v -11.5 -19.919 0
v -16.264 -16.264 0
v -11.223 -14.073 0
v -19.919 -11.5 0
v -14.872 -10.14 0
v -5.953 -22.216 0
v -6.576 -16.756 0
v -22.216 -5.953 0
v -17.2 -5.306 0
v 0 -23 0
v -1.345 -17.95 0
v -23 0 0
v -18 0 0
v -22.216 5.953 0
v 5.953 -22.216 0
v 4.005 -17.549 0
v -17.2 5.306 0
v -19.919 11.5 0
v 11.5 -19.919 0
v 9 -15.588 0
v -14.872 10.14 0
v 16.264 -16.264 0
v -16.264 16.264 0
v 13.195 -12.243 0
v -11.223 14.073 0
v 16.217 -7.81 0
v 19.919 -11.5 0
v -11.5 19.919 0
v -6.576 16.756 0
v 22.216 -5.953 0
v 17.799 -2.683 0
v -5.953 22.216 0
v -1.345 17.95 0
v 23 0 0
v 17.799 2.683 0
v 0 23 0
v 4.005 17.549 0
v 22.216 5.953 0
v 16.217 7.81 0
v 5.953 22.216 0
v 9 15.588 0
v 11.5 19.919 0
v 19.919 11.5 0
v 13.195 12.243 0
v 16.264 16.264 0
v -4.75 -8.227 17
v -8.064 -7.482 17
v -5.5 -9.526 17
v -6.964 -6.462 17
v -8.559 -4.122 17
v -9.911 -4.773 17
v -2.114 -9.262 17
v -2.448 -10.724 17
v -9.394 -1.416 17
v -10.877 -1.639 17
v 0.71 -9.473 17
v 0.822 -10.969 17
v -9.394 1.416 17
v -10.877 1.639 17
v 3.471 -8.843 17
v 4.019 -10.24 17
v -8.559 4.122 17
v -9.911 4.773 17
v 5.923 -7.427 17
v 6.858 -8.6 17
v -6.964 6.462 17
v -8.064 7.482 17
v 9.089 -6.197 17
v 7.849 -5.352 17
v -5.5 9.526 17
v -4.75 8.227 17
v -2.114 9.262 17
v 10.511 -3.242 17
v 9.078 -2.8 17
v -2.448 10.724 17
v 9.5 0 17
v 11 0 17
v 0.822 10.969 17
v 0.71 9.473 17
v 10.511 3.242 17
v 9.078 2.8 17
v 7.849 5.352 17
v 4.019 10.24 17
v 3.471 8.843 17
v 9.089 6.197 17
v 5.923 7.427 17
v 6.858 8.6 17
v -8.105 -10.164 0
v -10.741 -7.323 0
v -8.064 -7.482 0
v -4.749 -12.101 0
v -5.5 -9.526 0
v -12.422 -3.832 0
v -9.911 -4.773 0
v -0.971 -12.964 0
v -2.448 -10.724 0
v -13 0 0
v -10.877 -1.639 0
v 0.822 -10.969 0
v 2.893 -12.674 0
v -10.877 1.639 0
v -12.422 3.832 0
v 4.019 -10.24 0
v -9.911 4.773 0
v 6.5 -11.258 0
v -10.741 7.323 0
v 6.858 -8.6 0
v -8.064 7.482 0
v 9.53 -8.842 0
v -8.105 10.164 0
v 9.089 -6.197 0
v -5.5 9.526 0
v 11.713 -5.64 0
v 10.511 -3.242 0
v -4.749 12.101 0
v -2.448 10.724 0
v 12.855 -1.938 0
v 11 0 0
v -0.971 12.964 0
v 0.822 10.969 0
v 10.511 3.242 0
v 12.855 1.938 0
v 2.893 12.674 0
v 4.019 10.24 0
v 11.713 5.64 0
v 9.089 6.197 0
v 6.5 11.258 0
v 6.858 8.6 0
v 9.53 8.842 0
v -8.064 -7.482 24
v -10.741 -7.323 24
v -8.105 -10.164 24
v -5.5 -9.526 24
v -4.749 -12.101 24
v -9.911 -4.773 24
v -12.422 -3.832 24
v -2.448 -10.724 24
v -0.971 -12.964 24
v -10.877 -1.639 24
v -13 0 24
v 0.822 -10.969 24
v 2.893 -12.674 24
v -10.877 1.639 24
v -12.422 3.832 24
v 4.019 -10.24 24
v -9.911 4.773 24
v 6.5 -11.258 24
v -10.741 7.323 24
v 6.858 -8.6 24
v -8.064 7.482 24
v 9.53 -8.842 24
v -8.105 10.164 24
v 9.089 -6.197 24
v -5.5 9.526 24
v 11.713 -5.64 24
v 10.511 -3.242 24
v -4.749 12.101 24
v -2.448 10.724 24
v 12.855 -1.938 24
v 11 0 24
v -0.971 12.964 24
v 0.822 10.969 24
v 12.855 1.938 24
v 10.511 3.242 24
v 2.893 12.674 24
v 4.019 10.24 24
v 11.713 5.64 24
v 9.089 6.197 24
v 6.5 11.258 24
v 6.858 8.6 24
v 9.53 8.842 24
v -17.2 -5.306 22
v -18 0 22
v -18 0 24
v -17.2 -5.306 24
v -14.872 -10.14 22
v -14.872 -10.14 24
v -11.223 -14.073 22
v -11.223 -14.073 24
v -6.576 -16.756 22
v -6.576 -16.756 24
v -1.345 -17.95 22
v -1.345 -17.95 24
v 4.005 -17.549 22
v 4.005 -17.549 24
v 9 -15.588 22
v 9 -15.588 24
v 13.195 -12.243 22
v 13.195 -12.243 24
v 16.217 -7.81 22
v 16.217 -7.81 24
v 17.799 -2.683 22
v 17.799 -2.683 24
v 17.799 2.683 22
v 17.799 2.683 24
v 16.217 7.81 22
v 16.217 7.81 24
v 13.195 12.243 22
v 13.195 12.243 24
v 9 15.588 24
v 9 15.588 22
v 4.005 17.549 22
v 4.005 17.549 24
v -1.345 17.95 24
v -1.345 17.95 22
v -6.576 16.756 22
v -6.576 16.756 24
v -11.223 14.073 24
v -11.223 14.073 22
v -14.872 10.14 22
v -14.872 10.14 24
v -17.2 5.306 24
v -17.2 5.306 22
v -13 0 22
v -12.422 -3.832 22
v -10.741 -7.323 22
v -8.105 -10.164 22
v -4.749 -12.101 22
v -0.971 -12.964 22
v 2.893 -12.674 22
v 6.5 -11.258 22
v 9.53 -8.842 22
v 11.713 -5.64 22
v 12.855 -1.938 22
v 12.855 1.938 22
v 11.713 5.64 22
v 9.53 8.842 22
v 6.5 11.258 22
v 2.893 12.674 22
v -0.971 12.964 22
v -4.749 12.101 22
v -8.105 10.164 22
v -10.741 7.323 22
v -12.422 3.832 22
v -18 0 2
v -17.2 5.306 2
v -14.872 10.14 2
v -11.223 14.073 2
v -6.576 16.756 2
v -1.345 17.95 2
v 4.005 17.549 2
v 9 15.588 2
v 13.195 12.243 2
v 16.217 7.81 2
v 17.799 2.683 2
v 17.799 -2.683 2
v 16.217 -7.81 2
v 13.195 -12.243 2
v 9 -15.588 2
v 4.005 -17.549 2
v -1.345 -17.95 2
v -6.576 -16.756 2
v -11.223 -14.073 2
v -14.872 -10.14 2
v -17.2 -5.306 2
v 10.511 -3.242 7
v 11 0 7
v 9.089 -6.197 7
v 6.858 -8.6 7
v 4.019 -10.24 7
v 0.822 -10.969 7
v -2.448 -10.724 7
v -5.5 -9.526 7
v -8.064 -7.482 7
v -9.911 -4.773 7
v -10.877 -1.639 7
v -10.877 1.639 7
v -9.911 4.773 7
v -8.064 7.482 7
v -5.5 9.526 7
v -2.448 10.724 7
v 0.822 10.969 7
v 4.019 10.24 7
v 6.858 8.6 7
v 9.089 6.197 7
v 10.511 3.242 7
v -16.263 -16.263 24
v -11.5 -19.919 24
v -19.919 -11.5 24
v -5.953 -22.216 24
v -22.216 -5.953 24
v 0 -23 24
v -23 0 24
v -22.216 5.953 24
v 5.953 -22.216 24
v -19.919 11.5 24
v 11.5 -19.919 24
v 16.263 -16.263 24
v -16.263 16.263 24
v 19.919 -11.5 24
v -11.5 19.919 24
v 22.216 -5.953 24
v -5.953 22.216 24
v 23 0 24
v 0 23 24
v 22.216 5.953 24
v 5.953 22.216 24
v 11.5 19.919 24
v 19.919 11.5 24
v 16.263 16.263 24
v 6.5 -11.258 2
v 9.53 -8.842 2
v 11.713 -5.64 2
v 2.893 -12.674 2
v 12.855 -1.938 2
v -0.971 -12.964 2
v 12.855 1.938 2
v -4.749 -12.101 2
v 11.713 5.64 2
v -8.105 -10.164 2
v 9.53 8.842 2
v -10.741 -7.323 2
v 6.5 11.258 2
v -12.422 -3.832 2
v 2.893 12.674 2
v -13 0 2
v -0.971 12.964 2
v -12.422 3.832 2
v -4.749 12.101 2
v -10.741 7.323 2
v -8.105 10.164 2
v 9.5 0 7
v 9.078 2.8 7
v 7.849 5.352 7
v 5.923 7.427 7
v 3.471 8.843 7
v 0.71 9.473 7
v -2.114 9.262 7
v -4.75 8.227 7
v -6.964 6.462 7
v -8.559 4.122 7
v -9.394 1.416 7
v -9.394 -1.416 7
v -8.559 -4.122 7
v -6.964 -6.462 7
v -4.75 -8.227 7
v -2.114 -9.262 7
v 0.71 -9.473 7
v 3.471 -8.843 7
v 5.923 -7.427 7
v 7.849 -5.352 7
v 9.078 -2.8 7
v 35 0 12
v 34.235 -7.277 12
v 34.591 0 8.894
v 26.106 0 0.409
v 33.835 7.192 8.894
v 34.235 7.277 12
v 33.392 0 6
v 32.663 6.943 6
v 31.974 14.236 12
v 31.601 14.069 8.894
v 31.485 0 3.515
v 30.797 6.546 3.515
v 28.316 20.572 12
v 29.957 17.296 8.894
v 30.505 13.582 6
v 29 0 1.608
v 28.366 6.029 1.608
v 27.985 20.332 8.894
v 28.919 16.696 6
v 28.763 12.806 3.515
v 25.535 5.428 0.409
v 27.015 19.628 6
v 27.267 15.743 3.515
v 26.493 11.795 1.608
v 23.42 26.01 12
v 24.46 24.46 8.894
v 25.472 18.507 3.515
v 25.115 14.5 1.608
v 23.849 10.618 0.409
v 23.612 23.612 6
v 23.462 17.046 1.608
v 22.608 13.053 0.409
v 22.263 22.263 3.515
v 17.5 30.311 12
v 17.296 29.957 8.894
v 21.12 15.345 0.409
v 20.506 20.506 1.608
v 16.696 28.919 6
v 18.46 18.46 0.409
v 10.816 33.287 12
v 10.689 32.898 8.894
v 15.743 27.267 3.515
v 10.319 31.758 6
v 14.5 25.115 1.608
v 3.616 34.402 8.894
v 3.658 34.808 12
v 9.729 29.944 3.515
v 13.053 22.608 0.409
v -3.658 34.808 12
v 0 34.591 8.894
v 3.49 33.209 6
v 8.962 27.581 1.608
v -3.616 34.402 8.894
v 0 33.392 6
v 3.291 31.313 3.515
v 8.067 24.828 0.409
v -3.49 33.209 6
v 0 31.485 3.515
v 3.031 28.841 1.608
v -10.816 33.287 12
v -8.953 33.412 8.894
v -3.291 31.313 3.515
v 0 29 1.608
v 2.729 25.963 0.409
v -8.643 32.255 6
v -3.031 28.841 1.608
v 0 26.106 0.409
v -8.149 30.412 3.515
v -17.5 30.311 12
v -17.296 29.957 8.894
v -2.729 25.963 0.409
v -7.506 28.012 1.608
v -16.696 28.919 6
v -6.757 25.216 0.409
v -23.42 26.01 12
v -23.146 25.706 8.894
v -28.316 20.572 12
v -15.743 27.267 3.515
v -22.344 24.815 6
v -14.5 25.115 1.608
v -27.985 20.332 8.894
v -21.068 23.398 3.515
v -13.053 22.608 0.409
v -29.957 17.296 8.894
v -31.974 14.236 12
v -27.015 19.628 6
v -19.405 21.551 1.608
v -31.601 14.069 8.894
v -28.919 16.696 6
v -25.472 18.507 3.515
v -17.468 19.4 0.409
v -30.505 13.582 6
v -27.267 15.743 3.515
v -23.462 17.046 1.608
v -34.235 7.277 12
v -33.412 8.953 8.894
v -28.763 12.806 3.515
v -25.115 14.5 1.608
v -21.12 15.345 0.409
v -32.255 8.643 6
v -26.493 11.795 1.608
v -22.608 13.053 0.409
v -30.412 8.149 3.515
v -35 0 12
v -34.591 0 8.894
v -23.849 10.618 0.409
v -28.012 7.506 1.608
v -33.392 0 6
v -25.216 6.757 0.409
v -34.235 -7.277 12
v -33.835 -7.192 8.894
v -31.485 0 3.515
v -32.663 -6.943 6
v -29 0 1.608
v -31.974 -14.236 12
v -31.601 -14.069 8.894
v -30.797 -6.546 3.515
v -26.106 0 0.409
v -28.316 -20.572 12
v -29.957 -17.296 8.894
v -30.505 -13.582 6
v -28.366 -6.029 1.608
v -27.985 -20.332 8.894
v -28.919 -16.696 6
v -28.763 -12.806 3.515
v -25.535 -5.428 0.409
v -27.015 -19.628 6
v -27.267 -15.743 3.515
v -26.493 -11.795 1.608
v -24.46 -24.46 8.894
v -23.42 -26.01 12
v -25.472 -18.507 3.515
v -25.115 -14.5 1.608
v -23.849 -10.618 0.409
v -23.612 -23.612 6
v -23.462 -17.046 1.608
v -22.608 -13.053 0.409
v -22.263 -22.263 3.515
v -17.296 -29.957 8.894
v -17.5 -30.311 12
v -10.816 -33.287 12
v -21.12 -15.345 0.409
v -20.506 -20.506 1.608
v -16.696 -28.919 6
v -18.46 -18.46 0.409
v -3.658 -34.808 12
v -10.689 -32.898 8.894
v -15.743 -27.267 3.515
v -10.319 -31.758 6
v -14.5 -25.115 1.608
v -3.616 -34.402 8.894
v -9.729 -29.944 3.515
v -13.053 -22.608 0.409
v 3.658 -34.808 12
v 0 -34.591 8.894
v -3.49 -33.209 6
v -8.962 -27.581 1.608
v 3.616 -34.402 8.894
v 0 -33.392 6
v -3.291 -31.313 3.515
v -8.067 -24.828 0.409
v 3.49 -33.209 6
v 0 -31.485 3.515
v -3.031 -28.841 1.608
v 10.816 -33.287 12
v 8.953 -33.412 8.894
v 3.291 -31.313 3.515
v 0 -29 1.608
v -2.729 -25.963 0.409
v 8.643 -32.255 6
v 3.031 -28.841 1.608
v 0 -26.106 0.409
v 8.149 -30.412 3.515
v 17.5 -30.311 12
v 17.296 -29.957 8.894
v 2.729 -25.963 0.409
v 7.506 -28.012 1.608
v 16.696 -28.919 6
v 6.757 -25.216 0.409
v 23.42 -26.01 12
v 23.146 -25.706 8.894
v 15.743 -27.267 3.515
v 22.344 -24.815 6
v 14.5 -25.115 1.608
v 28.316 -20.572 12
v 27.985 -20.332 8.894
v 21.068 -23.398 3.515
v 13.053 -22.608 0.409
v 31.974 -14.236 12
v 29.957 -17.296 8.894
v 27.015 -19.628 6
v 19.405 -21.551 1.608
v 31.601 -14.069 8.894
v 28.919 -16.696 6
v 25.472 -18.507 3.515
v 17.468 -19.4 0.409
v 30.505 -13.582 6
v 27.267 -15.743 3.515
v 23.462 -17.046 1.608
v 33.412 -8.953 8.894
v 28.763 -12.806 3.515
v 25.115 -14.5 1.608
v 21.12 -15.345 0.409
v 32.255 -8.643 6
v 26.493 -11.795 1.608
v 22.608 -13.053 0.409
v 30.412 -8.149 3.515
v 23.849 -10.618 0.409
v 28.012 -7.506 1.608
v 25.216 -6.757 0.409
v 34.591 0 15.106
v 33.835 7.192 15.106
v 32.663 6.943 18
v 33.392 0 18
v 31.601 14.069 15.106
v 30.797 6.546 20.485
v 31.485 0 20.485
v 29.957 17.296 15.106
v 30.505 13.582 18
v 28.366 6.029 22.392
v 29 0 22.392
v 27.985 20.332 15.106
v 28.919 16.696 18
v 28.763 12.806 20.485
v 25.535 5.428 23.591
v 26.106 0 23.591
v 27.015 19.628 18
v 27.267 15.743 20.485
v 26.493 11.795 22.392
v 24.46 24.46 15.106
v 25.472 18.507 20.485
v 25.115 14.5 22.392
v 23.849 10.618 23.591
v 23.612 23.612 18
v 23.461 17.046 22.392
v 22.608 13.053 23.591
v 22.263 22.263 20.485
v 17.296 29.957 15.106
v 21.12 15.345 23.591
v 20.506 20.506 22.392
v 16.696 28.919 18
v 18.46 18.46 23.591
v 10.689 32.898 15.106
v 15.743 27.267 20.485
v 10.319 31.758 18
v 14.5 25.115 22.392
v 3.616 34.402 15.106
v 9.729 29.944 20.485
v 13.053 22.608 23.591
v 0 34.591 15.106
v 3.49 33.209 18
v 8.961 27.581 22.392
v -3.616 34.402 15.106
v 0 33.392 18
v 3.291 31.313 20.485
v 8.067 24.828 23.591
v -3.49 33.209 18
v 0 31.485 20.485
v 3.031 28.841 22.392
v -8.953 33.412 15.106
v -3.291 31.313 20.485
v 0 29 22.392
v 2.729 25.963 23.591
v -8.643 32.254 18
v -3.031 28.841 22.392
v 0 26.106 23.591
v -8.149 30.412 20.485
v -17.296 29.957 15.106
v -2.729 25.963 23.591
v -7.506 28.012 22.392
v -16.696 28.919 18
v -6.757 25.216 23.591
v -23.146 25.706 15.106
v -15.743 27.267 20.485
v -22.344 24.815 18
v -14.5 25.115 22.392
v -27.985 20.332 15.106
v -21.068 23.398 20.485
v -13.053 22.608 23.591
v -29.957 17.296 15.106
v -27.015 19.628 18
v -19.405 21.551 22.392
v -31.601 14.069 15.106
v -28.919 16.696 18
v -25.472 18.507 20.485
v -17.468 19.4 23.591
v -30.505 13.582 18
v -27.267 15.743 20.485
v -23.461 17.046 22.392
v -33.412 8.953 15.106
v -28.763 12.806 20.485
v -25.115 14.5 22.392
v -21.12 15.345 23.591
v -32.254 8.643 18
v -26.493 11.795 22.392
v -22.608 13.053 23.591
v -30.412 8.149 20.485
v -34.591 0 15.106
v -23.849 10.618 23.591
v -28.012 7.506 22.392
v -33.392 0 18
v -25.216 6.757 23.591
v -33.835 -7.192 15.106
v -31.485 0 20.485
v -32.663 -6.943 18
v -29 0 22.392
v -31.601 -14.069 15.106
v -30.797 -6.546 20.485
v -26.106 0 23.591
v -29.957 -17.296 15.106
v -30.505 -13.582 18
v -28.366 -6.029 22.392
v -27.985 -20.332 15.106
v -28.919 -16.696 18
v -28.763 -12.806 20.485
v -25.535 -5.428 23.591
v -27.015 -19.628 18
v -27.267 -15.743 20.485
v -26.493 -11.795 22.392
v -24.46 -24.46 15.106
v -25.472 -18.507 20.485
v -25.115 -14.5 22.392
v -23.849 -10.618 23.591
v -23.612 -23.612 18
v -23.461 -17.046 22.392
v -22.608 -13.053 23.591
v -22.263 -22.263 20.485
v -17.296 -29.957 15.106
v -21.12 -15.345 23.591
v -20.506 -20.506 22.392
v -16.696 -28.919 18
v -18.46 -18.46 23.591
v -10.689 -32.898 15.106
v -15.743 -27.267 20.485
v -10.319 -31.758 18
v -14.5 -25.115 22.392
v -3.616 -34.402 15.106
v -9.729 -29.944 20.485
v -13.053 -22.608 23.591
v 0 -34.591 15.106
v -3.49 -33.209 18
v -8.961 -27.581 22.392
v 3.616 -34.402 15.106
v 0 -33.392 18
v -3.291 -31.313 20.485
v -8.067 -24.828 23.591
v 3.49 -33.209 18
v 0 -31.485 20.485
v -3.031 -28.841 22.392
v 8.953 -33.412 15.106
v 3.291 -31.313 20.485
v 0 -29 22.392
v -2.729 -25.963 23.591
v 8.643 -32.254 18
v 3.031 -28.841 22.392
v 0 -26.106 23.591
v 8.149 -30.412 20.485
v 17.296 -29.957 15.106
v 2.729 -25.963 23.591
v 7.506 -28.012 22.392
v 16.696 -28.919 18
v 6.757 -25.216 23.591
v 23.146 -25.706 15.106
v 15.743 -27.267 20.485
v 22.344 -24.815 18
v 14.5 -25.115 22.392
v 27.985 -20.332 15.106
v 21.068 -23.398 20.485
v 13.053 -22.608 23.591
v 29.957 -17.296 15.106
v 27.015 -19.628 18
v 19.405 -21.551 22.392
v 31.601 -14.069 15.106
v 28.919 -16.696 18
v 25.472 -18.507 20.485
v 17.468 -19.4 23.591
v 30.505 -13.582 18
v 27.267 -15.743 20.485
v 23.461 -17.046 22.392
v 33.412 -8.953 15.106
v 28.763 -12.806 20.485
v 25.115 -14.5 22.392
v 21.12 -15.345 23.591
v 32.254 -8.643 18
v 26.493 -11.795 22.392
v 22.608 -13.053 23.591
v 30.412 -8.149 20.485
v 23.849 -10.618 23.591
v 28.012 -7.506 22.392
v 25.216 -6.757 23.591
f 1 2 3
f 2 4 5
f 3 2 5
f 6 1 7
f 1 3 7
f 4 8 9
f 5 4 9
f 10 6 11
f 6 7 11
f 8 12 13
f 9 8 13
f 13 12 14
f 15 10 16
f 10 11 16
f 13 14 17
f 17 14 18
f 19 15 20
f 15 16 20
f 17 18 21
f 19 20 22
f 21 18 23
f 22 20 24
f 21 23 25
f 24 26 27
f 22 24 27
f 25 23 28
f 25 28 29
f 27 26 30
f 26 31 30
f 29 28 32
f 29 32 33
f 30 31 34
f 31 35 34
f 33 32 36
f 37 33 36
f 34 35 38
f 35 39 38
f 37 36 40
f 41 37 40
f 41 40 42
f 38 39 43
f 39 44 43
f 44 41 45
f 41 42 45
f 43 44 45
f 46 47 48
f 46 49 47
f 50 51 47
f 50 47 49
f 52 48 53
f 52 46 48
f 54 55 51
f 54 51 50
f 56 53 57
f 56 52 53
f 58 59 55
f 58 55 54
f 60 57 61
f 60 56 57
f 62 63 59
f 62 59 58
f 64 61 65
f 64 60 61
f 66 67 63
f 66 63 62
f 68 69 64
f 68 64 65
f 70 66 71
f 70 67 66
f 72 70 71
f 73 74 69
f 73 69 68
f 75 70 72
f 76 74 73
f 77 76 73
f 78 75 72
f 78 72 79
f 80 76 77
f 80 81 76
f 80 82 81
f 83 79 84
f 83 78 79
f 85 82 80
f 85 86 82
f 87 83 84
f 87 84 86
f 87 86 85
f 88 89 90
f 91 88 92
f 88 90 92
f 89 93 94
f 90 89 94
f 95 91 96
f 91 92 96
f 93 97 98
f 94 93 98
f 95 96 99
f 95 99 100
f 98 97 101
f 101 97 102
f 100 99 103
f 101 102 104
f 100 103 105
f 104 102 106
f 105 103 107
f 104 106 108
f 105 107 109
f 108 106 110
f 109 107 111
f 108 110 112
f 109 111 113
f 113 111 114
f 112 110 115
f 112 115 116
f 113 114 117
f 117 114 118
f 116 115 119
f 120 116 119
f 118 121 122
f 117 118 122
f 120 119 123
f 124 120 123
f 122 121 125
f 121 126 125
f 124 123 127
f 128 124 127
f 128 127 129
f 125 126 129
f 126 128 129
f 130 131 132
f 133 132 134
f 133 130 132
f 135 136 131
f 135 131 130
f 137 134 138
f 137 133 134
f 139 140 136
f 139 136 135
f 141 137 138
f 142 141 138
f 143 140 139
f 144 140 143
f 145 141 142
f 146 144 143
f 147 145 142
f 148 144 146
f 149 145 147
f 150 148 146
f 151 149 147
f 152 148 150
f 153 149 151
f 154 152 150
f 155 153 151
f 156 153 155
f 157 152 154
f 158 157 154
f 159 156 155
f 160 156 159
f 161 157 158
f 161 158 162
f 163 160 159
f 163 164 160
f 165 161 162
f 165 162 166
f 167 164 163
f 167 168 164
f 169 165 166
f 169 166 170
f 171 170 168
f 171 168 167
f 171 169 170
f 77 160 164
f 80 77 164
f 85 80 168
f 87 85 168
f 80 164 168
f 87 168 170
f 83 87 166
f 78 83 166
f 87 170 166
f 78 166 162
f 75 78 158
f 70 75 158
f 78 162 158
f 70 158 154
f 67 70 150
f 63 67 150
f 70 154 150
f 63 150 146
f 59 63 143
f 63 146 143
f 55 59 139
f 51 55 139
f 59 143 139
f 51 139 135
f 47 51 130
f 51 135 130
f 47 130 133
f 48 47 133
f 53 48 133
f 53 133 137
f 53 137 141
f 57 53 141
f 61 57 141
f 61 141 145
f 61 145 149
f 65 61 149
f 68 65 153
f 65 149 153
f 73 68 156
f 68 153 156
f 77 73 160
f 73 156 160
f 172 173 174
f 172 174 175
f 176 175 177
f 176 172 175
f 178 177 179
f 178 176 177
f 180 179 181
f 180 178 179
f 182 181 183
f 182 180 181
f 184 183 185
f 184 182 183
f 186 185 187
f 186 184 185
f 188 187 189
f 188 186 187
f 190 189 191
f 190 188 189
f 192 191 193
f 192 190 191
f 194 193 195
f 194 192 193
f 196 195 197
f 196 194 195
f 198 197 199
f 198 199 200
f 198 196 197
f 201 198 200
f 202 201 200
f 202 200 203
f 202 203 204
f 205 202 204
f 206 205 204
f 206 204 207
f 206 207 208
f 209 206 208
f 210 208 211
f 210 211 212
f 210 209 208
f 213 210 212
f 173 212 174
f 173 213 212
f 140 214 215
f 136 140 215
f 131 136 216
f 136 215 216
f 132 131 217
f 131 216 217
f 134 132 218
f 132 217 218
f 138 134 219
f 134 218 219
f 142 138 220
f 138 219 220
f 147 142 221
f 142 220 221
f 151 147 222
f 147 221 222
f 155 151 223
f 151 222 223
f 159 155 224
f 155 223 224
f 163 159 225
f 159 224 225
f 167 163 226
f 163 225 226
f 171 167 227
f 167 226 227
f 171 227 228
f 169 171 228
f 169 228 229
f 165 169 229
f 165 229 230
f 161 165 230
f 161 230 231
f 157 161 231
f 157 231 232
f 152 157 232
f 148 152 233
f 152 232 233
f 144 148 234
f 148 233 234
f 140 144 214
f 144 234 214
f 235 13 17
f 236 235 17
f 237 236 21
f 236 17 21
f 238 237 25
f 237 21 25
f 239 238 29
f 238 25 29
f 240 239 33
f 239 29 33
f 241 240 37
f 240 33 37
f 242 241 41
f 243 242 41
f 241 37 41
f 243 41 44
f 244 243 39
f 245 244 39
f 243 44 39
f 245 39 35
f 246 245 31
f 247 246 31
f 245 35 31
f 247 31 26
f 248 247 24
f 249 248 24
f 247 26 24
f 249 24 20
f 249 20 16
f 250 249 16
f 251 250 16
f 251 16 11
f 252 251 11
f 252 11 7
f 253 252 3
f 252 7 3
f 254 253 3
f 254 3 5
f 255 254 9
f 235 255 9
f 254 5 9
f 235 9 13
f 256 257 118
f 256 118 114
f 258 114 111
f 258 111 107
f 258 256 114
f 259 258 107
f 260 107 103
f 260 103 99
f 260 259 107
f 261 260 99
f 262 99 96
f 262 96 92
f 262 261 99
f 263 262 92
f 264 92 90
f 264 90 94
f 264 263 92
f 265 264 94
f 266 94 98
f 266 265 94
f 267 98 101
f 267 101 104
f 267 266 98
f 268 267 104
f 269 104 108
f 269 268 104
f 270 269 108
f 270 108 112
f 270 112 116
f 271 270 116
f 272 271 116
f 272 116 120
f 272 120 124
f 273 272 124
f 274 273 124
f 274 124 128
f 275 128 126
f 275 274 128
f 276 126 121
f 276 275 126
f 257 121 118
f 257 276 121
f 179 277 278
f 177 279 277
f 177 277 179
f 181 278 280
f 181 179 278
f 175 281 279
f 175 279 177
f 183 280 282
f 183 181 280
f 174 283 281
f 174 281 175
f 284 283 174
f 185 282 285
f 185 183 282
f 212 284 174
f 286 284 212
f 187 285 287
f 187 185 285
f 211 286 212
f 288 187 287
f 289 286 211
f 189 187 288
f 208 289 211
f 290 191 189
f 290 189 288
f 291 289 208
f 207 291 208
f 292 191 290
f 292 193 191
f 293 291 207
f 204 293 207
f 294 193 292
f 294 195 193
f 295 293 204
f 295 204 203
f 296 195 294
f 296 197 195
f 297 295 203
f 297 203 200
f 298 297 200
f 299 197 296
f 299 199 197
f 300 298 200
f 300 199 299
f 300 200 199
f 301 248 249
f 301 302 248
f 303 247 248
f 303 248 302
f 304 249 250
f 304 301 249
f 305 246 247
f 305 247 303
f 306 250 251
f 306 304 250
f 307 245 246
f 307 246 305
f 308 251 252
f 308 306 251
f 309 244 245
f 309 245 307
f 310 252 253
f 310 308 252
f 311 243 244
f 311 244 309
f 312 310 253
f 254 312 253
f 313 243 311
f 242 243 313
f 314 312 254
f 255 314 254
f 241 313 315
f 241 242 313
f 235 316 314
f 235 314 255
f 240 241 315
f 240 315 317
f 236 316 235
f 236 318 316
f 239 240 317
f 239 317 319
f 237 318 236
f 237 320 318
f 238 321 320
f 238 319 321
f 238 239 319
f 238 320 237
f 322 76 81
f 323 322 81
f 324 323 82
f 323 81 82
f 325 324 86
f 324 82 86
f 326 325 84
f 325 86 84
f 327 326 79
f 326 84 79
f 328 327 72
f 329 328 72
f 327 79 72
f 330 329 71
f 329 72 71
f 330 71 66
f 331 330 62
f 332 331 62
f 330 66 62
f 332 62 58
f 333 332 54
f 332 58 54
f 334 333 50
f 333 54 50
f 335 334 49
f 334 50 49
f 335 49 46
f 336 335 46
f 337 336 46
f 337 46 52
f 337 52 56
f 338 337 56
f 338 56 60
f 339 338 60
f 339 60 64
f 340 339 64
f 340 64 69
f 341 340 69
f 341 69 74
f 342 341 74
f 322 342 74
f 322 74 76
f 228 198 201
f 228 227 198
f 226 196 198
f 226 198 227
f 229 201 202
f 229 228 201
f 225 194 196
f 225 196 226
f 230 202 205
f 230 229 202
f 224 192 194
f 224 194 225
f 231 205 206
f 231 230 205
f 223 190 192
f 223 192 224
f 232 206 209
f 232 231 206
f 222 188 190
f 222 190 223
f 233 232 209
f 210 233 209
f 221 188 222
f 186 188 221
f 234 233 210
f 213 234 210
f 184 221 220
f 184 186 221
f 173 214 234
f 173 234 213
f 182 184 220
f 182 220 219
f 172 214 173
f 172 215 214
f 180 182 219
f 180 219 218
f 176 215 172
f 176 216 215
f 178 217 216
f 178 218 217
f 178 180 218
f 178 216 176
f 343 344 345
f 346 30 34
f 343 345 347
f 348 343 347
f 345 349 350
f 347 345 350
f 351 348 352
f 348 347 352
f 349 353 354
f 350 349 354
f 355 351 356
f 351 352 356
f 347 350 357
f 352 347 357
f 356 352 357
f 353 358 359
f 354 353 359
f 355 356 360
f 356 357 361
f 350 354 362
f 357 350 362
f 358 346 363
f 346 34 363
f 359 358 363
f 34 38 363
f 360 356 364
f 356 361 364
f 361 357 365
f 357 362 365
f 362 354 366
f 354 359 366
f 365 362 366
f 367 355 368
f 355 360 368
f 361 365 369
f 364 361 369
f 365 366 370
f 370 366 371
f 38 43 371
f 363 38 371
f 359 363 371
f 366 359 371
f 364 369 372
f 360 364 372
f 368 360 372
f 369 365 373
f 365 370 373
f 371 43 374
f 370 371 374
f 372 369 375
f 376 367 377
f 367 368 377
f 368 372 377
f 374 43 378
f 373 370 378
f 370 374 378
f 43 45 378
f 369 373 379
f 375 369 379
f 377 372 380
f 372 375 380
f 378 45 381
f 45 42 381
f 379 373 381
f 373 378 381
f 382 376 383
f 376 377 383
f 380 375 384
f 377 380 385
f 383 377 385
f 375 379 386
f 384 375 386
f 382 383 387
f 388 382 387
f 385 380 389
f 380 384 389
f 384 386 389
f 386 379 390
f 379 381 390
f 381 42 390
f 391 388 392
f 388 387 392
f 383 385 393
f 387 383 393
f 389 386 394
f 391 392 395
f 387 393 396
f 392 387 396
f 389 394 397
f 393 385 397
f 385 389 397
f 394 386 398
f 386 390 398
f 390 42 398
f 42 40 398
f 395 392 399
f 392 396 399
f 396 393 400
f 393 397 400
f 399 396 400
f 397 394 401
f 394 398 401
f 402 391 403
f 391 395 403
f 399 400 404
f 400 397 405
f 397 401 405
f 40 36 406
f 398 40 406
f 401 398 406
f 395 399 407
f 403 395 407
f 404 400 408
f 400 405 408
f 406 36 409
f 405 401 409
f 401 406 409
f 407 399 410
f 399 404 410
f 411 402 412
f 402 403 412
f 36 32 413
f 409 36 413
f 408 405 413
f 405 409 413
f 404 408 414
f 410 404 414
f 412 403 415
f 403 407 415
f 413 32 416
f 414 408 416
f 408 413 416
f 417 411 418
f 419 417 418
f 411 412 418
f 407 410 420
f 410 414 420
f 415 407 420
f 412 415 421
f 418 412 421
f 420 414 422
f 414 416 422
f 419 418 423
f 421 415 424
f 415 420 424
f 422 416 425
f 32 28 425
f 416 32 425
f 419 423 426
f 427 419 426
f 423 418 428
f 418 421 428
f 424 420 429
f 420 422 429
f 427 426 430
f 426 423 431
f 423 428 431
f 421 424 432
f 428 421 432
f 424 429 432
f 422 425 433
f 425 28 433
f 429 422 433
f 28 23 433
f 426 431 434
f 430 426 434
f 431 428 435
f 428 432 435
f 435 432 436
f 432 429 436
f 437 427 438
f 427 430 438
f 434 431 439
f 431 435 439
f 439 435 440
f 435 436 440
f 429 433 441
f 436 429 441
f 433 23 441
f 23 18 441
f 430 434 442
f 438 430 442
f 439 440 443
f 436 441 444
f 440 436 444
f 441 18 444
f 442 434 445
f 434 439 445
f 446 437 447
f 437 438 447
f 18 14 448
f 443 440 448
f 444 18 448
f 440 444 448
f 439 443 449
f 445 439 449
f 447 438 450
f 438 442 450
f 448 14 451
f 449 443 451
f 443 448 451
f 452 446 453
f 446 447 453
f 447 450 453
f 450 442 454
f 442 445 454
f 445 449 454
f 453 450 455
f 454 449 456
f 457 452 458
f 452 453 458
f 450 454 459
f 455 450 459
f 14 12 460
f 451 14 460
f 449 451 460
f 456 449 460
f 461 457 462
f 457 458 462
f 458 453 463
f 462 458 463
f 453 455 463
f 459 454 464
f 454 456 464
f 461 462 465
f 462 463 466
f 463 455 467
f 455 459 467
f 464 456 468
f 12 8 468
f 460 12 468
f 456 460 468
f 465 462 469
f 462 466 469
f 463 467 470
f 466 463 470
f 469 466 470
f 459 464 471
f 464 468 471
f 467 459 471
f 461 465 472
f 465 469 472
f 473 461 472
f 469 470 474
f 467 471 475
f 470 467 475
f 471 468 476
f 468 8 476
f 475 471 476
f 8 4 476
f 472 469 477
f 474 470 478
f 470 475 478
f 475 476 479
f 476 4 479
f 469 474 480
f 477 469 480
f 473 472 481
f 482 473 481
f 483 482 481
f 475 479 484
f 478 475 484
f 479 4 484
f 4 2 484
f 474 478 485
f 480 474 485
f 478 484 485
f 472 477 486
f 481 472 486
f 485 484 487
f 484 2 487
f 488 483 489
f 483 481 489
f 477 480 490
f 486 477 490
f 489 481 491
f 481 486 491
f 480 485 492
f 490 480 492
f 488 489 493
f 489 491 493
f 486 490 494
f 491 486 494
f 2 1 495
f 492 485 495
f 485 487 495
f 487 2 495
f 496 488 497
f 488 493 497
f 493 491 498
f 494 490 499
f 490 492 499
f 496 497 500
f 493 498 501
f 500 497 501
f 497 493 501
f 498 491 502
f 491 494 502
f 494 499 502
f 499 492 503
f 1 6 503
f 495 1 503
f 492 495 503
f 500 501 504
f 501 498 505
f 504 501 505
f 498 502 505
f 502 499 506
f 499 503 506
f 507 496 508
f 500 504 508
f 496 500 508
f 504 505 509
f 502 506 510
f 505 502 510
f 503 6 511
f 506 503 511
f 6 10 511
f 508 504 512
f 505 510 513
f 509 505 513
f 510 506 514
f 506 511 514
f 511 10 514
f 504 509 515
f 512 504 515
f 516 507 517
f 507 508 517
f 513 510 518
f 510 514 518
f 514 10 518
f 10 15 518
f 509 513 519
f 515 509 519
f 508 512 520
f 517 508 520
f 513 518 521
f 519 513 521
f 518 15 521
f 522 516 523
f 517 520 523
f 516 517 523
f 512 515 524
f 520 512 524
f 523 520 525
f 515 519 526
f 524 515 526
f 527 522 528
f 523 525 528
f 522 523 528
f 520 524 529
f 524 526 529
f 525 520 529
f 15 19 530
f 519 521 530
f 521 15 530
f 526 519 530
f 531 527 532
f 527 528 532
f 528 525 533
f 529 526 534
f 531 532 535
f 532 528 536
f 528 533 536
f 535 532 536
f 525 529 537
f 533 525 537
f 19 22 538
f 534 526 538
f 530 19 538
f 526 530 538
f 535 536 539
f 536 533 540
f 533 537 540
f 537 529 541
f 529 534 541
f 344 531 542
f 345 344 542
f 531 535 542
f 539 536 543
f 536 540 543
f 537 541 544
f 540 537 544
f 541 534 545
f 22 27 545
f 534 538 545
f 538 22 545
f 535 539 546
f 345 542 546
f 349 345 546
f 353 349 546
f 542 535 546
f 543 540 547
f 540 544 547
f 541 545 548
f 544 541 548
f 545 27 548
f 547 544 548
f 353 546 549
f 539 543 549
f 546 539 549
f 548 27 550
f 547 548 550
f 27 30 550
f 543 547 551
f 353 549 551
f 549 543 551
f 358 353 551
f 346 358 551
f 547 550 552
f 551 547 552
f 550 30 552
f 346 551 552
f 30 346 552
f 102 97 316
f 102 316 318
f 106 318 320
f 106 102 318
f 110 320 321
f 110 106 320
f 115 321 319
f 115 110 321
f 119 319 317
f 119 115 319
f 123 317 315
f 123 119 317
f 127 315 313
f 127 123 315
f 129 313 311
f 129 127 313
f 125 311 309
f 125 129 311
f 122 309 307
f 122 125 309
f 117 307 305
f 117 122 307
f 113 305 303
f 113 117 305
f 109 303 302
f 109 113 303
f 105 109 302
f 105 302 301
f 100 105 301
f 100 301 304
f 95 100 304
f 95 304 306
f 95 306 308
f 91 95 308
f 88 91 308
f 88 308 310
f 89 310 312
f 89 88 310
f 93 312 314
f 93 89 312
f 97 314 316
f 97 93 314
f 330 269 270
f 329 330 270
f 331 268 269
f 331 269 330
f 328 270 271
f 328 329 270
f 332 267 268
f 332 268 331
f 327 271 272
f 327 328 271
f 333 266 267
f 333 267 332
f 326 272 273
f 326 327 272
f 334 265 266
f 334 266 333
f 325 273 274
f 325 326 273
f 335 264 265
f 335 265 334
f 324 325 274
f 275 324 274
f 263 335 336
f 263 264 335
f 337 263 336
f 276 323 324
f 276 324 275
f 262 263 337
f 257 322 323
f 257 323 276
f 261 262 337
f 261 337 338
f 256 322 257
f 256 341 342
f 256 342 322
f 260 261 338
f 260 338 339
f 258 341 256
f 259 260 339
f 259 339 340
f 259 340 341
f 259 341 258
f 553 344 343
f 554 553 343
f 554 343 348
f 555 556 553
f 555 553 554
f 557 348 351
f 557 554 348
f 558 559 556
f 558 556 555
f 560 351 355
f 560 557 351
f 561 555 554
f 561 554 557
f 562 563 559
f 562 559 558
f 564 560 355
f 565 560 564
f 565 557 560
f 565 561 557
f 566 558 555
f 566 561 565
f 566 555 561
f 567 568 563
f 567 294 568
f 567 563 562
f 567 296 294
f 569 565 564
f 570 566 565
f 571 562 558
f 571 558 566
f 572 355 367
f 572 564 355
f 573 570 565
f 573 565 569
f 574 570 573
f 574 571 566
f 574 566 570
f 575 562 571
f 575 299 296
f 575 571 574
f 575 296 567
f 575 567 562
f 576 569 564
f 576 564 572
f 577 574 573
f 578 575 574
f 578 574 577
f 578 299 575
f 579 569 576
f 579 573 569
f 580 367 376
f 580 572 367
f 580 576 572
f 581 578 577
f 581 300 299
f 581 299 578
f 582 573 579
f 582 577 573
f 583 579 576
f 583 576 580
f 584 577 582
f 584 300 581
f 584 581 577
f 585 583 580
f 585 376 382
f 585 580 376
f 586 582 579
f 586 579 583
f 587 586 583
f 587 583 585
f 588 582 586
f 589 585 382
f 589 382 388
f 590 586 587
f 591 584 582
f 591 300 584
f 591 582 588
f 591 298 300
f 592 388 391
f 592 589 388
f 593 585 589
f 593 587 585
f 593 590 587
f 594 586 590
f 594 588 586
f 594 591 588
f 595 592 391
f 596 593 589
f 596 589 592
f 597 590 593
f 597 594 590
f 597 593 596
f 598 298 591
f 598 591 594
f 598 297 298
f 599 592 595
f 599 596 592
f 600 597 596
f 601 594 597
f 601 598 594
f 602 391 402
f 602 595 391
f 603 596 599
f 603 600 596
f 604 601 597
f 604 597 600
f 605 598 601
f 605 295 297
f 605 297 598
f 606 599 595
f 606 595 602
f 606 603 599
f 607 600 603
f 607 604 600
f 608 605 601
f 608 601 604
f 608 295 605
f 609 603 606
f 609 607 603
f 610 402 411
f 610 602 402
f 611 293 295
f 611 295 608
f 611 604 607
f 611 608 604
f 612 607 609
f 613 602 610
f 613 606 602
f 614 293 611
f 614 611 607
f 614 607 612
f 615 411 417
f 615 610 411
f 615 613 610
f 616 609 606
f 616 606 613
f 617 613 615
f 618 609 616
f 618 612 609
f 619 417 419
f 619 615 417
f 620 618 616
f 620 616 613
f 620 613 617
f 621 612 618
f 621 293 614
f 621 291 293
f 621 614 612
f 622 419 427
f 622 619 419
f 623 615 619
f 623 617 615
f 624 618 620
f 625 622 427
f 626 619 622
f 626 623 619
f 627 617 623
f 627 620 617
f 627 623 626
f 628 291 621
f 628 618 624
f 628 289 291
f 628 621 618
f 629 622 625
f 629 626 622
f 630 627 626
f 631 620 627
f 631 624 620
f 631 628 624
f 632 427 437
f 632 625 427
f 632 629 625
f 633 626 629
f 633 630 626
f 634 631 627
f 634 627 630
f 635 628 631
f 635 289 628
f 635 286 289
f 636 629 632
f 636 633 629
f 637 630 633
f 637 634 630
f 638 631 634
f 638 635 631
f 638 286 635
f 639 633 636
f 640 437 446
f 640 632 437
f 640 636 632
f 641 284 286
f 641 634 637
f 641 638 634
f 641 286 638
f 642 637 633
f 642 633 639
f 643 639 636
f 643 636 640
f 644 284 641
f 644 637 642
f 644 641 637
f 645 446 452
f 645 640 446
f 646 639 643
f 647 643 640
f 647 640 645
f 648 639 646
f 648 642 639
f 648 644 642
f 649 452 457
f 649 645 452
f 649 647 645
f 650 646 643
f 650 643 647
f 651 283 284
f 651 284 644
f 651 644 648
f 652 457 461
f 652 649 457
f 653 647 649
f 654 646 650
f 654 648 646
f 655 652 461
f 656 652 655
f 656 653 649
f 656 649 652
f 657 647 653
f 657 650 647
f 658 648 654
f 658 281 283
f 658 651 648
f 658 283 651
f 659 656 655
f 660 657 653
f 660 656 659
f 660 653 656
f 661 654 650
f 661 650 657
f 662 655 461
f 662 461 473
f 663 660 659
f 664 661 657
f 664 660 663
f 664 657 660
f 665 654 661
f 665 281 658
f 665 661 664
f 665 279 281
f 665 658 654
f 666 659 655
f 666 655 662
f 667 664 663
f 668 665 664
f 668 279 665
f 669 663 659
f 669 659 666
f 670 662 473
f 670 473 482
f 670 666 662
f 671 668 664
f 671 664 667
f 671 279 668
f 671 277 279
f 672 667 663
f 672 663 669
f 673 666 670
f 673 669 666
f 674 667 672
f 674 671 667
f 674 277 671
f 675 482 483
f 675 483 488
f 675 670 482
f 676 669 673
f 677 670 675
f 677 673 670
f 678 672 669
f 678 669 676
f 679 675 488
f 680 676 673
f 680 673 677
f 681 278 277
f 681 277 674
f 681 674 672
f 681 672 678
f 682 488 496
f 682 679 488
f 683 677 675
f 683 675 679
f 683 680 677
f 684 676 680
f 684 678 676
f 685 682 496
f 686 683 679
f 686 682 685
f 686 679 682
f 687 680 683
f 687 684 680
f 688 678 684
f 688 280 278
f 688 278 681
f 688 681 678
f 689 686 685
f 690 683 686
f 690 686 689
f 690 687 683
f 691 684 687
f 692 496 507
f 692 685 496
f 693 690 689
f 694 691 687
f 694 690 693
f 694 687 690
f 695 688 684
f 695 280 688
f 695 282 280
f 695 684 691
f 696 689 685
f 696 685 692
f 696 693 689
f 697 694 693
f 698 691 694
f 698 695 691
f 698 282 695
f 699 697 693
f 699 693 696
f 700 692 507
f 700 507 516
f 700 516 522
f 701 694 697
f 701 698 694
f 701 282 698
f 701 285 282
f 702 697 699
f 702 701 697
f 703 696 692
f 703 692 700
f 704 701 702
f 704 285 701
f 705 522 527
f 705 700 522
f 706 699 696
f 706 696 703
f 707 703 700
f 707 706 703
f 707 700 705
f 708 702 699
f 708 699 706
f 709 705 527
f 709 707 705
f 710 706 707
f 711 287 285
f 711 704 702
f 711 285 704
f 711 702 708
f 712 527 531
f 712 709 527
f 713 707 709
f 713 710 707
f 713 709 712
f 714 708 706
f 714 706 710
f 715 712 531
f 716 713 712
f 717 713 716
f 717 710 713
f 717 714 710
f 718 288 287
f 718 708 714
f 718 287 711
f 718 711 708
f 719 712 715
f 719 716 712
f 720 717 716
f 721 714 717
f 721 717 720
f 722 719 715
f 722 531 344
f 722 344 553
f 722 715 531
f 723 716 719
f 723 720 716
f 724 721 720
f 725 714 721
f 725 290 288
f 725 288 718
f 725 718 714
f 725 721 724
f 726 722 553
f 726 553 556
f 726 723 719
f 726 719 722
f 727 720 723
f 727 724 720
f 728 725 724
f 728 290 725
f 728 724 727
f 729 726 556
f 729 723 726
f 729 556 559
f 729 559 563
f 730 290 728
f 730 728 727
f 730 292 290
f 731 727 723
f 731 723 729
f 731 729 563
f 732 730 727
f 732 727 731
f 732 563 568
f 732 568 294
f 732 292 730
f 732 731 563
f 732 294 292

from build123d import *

# Parameters (mm, degrees)
ESQUISSE1_R             = 35
EXTRUSION1_DEPTH        = 24
CONG_1_R                = 12
CONG_2_R                = 12
ESQUISSE2_R             = 11
ENL_V_MAT_EXTRU_1_DEPTH = 7
ENL_V_START             = -7
ESQUISSE3_R             = 11
ENL_V_MAT_EXTRU_2_DEPTH = 7
ESQUISSE5_R             = 9.5
ENL_V_MAT_EXTRU_3_DEPTH = 53.335456499
ESQUISSE8_R             = 18
ESQUISSE8_R_2           = 13
ENL_V_MAT_EXTRU_4_DEPTH = 2
ENL_V_START_2           = -2
ESQUISSE9_R             = 18
ESQUISSE9_R_2           = 13
ENL_V_MAT_EXTRU_5_DEPTH = 2


with BuildPart() as part:
    # Esquisse1 → Extrusion1 (new body)
    with BuildSketch(Plane.XY):
        Circle(ESQUISSE1_R)
    extrude(amount=EXTRUSION1_DEPTH)

    # Congé1
    cong_1_edges = [part.edges().sort_by_distance(p)[0] for p in [
        (-35, 0, 24),
    ]]
    fillet(cong_1_edges, radius=CONG_1_R)

    # Congé2
    cong_2_edges = [part.edges().sort_by_distance(p)[0] for p in [
        (-35, 0, 0),
    ]]
    fillet(cong_2_edges, radius=CONG_2_R - 0.0001)  # a hair under: the kernel refuses the full size

    # Esquisse2 → Enlèv. mat.-Extru.1 (cut)
    with BuildSketch(Plane.XY.offset(24)):
        Circle(ESQUISSE2_R)
    extrude(amount=-ENL_V_MAT_EXTRU_1_DEPTH, mode=Mode.SUBTRACT)

    # Esquisse3 → Enlèv. mat.-Extru.2 (cut)
    with BuildSketch(Plane(origin=(0, 0, 0), x_dir=(-1, 0, 0), z_dir=(0, 0, -1)).offset(ENL_V_START)):
        with Locations(Location((0, 0, 0), (0, 0, 180))):
            Circle(ESQUISSE3_R)
    extrude(amount=ENL_V_MAT_EXTRU_2_DEPTH, mode=Mode.SUBTRACT)

    # Esquisse5 → Enlèv. mat.-Extru.3 (cut, through all)
    with BuildSketch(Plane.XY.offset(17)):
        Circle(ESQUISSE5_R)
    extrude(amount=-ENL_V_MAT_EXTRU_3_DEPTH, mode=Mode.SUBTRACT)

    # Esquisse8 → Enlèv. mat.-Extru.4 (cut)
    with BuildSketch(Plane(origin=(0, 0, 0), x_dir=(-1, 0, 0), z_dir=(0, 0, -1))):
        Circle(ESQUISSE8_R)
        Circle(ESQUISSE8_R_2, mode=Mode.SUBTRACT)
    extrude(amount=-ENL_V_MAT_EXTRU_4_DEPTH, mode=Mode.SUBTRACT)

    # Esquisse9 → Enlèv. mat.-Extru.5 (cut)
    with BuildSketch(Plane.XY.offset(24).offset(ENL_V_START_2)):
        with Locations(Location((0, 0, 0), (0, 0, 180))):
            Circle(ESQUISSE9_R)
        with Locations(Location((0, 0, 0), (0, 0, 180))):
            Circle(ESQUISSE9_R_2, mode=Mode.SUBTRACT)
    extrude(amount=ENL_V_MAT_EXTRU_5_DEPTH, mode=Mode.SUBTRACT)


solid = part.part
